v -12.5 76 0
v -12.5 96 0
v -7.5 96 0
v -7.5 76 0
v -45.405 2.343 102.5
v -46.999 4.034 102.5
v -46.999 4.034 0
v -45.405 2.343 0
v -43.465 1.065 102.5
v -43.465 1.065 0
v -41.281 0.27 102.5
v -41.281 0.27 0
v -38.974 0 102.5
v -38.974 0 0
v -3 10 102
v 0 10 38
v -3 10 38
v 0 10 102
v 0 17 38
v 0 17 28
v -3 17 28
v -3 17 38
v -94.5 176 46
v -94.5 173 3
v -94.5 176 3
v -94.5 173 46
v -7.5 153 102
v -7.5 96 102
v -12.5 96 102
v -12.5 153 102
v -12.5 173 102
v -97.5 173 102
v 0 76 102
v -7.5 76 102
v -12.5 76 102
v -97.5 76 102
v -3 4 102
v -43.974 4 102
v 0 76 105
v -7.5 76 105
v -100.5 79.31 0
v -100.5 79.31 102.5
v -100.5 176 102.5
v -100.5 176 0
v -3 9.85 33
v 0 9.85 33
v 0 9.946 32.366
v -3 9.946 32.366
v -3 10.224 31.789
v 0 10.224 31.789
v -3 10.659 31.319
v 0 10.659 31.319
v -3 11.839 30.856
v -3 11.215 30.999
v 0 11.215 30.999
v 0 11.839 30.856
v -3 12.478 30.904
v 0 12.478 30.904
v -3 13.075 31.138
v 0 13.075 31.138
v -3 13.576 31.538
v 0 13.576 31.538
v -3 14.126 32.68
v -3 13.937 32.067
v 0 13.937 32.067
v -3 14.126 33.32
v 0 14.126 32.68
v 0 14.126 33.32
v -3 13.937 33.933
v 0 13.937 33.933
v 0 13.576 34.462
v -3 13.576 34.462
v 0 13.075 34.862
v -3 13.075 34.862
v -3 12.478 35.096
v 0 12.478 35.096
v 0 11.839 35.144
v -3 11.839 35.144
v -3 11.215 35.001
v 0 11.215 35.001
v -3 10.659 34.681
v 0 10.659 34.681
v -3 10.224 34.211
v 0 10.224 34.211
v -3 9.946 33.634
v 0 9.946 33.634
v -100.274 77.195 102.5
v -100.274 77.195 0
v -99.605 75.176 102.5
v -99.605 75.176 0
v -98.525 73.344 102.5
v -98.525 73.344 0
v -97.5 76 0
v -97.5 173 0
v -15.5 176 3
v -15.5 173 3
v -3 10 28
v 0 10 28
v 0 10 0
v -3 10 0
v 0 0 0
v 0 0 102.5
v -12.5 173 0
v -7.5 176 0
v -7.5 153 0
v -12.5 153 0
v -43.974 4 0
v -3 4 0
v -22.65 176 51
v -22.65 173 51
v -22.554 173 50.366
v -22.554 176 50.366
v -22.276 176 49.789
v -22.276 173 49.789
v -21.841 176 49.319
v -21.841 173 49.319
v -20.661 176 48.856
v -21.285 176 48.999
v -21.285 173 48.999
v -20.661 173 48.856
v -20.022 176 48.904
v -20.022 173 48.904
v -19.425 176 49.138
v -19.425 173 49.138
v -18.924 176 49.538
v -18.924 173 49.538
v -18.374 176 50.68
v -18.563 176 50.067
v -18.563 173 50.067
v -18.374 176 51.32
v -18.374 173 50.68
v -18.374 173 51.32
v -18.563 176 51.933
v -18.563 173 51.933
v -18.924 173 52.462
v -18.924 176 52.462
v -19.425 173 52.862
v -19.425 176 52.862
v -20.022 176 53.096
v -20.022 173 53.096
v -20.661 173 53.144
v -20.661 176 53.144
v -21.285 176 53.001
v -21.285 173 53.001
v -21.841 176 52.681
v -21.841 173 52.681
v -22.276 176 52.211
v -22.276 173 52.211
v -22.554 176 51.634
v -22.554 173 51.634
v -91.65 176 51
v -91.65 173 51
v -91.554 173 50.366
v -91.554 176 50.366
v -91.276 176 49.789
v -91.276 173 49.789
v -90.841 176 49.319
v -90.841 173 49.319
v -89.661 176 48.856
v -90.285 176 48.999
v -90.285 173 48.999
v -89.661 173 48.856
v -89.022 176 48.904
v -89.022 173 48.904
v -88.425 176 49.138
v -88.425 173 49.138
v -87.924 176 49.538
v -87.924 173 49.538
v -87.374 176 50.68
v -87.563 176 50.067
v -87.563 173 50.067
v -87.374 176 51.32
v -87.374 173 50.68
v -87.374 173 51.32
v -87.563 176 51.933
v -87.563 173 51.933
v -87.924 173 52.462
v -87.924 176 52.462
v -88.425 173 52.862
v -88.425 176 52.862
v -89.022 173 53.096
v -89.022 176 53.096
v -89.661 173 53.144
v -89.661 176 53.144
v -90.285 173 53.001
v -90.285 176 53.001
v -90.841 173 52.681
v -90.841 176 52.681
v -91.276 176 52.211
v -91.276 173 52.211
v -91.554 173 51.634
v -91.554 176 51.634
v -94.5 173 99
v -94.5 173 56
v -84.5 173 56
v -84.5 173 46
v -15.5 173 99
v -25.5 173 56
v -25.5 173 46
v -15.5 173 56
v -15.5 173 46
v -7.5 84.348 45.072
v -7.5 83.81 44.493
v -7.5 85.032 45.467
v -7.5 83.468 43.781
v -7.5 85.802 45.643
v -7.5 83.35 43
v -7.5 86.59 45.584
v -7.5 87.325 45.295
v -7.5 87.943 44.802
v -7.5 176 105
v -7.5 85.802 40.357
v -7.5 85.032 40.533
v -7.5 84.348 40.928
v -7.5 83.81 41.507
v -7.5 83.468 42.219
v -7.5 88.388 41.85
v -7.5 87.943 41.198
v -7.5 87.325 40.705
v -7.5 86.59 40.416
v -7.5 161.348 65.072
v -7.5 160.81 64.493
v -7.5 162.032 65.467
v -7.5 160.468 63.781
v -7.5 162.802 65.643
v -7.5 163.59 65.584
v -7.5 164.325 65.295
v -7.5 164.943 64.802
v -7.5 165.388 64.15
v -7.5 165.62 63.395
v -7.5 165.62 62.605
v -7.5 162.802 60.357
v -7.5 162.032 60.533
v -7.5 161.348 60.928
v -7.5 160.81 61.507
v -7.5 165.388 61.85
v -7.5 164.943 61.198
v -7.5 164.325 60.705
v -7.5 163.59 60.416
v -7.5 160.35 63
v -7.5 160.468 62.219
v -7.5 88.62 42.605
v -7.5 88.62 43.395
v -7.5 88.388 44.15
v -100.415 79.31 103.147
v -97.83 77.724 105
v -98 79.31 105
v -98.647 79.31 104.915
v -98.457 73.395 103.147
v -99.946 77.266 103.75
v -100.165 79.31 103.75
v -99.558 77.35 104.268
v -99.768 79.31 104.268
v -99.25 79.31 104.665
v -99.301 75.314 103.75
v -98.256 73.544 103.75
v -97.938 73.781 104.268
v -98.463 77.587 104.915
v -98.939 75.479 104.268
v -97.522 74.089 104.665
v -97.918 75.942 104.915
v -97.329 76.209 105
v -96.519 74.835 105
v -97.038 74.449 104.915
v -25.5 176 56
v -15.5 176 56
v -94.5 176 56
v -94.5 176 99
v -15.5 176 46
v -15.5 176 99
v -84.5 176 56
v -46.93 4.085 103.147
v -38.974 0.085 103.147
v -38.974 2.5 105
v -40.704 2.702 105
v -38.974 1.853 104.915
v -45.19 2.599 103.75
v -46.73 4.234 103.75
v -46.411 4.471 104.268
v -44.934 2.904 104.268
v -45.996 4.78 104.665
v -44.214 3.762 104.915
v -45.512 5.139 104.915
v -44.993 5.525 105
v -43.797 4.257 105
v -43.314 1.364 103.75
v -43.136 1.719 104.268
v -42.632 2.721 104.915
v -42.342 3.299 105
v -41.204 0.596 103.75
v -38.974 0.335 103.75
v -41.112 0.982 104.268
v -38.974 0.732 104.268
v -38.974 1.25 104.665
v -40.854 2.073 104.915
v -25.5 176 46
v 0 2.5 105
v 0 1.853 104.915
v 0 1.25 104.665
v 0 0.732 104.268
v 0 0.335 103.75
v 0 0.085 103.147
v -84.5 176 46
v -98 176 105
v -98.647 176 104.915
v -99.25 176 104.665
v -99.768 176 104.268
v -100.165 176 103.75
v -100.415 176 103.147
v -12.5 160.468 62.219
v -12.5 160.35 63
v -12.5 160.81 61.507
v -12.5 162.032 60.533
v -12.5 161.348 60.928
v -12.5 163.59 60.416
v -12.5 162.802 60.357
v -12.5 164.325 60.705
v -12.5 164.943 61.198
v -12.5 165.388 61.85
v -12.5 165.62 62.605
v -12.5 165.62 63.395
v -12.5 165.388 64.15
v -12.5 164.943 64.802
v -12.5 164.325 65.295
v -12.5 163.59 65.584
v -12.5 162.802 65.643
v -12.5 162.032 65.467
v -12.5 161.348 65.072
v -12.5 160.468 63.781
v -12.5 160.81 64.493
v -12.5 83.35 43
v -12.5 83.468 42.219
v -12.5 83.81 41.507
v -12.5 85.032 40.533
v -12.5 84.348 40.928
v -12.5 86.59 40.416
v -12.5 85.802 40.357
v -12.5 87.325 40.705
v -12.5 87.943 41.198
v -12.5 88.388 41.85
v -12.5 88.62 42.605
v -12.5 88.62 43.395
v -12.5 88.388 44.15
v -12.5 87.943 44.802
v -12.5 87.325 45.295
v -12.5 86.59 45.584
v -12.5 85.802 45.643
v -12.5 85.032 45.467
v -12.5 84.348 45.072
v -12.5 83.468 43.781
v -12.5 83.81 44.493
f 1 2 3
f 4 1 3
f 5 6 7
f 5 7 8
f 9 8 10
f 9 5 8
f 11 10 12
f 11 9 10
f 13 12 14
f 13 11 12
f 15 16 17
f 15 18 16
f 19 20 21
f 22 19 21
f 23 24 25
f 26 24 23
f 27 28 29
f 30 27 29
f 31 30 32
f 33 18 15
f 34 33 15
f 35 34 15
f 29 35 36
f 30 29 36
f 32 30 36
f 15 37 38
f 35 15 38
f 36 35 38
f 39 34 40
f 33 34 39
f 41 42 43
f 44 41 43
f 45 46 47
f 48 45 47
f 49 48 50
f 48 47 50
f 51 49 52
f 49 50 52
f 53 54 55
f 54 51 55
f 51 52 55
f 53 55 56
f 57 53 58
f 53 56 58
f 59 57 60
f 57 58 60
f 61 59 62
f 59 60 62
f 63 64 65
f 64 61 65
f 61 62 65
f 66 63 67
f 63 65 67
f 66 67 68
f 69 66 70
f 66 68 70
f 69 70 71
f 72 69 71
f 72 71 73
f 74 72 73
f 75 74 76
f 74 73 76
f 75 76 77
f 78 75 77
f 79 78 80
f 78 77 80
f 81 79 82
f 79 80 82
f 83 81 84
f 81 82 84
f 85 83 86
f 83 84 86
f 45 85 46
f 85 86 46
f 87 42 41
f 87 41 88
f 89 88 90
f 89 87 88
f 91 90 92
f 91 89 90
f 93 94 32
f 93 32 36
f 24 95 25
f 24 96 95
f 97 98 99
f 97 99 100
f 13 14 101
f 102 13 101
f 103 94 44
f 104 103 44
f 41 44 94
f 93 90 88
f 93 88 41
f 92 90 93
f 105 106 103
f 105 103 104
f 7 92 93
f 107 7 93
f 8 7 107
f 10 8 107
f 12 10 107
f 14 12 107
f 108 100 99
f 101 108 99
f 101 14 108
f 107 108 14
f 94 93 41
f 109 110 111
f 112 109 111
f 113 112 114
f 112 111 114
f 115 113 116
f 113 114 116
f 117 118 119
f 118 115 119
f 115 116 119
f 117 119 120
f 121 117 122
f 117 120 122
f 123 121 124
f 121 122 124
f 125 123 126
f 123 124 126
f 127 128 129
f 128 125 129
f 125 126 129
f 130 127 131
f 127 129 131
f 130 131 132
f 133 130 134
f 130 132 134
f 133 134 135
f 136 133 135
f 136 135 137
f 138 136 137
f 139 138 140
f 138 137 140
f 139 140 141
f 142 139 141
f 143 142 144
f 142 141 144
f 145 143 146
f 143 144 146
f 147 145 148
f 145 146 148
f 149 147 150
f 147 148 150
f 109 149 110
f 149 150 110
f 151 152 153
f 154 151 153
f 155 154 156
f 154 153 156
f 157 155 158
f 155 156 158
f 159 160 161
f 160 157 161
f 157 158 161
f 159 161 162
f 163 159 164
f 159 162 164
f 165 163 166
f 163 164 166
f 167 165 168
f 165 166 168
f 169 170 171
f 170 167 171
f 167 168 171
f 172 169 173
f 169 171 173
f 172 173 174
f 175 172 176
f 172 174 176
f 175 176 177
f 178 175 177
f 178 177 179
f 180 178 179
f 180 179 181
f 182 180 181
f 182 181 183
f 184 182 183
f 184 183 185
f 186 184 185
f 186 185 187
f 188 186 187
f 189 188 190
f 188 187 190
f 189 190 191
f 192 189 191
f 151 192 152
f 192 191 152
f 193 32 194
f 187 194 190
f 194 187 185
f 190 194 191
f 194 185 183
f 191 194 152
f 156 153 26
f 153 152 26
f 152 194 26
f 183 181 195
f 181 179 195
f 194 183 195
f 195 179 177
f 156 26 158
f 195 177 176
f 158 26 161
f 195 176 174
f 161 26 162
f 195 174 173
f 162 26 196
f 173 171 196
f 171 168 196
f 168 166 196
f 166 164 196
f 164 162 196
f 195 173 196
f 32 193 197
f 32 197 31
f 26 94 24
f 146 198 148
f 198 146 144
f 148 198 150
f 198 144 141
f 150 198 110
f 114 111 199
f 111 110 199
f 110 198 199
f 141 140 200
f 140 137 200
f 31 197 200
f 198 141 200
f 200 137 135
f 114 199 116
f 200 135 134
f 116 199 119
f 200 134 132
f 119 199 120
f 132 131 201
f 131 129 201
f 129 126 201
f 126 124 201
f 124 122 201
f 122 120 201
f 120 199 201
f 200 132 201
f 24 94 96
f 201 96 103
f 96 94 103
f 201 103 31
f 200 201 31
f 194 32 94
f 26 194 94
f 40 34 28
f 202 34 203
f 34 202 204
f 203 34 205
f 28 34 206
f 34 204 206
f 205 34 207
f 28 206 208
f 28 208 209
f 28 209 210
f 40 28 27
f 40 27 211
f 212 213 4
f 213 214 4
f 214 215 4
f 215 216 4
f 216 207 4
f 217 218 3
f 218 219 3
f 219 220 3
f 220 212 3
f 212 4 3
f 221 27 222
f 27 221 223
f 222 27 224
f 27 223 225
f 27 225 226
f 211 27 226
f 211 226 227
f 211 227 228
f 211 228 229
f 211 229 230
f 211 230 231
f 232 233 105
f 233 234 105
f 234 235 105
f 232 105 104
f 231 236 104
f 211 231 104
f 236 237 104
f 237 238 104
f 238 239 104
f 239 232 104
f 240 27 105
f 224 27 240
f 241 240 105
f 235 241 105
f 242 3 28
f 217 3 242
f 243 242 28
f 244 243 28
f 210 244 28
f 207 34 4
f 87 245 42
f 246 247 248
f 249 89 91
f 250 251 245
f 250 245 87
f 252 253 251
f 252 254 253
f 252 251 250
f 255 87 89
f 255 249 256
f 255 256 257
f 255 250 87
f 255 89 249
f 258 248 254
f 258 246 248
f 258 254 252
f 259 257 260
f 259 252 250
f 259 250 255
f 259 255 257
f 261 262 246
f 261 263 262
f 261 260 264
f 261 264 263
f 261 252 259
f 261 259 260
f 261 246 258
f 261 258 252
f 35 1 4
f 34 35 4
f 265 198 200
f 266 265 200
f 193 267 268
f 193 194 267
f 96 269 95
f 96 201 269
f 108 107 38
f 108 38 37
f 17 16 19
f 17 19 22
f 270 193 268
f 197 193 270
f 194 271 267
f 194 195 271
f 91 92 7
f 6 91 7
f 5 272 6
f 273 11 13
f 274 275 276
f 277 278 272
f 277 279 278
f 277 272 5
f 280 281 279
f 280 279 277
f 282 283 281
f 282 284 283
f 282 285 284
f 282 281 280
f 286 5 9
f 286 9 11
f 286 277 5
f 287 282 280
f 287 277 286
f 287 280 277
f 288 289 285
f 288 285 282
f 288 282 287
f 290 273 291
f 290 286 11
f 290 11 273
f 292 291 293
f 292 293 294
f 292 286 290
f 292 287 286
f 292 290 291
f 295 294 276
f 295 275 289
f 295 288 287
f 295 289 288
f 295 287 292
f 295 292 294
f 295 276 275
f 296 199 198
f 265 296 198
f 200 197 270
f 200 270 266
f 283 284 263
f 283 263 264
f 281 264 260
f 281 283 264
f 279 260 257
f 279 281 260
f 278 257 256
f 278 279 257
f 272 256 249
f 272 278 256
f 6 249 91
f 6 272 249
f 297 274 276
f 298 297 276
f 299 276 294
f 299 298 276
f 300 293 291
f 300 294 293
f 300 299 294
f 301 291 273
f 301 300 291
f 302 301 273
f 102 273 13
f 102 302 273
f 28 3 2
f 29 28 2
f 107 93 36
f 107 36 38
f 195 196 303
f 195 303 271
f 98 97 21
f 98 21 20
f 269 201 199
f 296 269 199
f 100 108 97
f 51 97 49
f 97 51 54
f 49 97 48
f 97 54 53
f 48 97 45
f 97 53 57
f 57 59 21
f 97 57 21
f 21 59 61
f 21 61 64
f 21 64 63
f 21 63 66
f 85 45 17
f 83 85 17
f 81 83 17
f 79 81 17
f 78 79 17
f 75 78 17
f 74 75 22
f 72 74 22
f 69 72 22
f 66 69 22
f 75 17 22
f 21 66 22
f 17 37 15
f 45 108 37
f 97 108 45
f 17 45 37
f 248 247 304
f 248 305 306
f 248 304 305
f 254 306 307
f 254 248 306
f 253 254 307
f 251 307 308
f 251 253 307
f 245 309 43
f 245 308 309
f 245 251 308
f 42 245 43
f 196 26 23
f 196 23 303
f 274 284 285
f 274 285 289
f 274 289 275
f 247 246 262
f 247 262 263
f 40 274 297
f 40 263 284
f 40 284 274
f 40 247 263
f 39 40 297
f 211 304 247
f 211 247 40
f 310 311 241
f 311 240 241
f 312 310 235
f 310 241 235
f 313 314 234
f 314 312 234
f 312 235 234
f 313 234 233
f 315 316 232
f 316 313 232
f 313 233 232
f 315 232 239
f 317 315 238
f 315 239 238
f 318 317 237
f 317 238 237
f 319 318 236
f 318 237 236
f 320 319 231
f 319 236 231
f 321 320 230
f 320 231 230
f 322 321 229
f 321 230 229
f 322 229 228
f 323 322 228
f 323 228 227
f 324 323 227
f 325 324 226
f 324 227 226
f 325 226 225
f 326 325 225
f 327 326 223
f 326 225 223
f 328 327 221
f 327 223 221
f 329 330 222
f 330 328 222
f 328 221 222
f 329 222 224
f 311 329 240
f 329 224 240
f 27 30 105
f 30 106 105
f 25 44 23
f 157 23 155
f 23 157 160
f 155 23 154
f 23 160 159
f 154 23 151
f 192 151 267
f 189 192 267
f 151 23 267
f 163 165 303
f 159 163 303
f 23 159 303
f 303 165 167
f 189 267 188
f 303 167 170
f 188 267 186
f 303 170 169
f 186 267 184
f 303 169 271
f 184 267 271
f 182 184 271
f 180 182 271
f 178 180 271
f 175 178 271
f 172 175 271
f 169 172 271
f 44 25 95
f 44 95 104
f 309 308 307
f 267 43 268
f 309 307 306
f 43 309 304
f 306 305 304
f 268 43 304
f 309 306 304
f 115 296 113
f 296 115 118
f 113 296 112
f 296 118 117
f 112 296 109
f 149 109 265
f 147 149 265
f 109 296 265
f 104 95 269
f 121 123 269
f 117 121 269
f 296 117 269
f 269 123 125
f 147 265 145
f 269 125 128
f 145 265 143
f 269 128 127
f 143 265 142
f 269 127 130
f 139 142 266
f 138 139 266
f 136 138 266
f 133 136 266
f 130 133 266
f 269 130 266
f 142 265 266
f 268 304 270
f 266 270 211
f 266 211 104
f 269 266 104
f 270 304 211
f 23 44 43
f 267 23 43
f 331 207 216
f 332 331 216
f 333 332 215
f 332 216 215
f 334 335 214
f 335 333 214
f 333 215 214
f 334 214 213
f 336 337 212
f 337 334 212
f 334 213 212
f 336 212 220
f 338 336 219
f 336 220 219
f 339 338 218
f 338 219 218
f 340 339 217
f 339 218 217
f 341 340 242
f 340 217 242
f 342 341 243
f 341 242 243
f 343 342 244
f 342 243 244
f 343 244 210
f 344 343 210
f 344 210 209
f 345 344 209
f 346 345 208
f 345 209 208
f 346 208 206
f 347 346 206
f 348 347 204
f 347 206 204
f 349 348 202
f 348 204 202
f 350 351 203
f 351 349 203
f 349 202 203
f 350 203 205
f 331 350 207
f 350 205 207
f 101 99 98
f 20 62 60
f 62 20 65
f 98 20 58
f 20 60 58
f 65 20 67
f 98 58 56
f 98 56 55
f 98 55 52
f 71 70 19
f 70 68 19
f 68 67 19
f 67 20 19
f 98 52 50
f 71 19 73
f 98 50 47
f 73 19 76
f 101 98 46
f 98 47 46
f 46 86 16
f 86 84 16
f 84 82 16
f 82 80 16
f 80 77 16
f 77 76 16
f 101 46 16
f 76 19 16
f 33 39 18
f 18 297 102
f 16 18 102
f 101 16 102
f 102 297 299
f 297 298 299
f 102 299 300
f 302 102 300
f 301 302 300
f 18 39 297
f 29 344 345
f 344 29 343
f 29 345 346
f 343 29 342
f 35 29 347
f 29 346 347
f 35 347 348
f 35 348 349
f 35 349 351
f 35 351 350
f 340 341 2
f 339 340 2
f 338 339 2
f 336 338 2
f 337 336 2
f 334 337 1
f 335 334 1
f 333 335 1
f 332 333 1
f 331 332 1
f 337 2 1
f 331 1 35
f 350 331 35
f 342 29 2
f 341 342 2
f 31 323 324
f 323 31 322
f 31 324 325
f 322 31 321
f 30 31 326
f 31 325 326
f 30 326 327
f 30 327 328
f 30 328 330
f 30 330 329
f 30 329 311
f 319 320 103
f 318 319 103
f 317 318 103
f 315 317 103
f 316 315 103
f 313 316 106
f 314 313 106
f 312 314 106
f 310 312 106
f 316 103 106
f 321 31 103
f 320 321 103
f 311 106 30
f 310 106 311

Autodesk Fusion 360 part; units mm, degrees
sketch "스케치1" plane through (0, 0, 0) normal (0, 0, 1) x (1, 0, 0)
  line L0 (0, 0) -> (44, 0)
  line L1 (0, 0) -> (0, 4)
  line L2 (0, 4) -> (41, 4)
  line L3 (0, 0) -> (44, 0)
  line L4 (44, 0) -> (100.5, 76)
  line L5 (100.5, 76) -> (97.5, 76)
  line L6 (44, 0) -> (41, 0)
  line L7 (41, 0) -> (97.5, 76)
  line L8 (41, 4) -> (43.9737, 4)
  line L9 (100.5, 76) -> (97.5, 76)
  line L10 (97.5, 76) -> (97.5, 176)
  line L11 (97.5, 176) -> (100.5, 176)
  line L12 (100.5, 176) -> (100.5, 76)
  line L13 (0, 4) -> (0, 76)
  line L14 (0, 76) -> (7.5, 76)
  line L15 (7.5, 76) -> (12.5, 76)
  line L16 (12.5, 76) -> (12.5, 96)
  line L17 (12.5, 96) -> (7.5, 96)
  line L18 (7.5, 96) -> (7.5, 76)
  line L19 (97.5, 176) -> (12.5, 176)
  line L20 (12.5, 176) -> (12.5, 173)
  line L21 (12.5, 173) -> (97.5, 173)
  line L22 (97.5, 173) -> (97.5, 176)
  line L23 (12.5, 176) -> (7.5, 176)
  line L24 (7.5, 176) -> (7.5, 153)
  line L25 (7.5, 153) -> (12.5, 153)
  line L26 (12.5, 153) -> (12.5, 176)
  dimension "d1" = 44
  dimension "d2" = 4
  dimension "d3" = 41
  dimension "d7" = 3
  dimension "d8" = 3
  dimension "d9" = 3
  dimension "d10" = 100
  dimension "d19" = 72
  dimension "d20" = 7.5
  dimension "d21" = 5
  dimension "d22" = 20
  dimension "d26" = 85
  dimension "d27" = 3
  dimension "d28" = 23
extrude "돌출1" add sketch "스케치1" along normal blind 105 makes body 1 at (100.5, 142.6667, 35) makes body 2 at (7.5, 89.3333, 35)
sketch "스케치2" plane through (0, 0, 105) normal (0, 0, 1) x (-1, 0, 0)
  line L0 (0, 0) -> (-44, 0)
  line L1 (-44, 0) -> (-100.5, -76)
  line L2 (-100.5, -76) -> (-100.5, -176)
  line L3 (-100.5, -176) -> (-7.5, -176)
  line L4 (-97.5, -173) -> (-97.5, -76)
  line L5 (-97.5, -76) -> (-43.9737, -4)
  line L6 (-43.9737, -4) -> (0, -4)
  line L7 (0, -4) -> (0, 0)
  line L8 (0, -4) -> (0, -176)
  line L9 (0, -176) -> (-7.5, -176)
  line L10 (-12.5, -153) -> (-12.5, -173)
  line L11 (-12.5, -173) -> (-97.5, -173)
  line L12 (-7.5, -176) -> (-7.5, -153)
  line L13 (-7.5, -153) -> (-12.5, -153)
extrude "돌출2" add sketch "스케치2" against normal blind 3 contours L4 L5 L6 L8 L9 L10 L11 L12 L13 bodies 1 2
fillet "필렛1" radius 10 2 edges at (100.5, 76, 52.5) (44, 0, 52.5) on bodies 1
fillet "필렛2" radius 2.5 5 edges at (19.4868, 0, 105) (43.4646, 1.0652, 105) (72.7621, 38.6888, 105) (99.9935, 76.1676, 105) (100.5, 127.6549, 105) on bodies 1
sketch "스케치3" plane through (0, 173, 0) normal (0, -1, 0) x (1, 0, 0)
  line L0 (97.5, 102) -> (12.5, 102)
  line L1 (12.5, 102) -> (12.5, 0)
  line L2 (12.5, 0) -> (97.5, 0)
  line L3 (97.5, 0) -> (97.5, 102)
  line L4 (97.5, 0) -> (94.5, 0)
  line L5 (94.5, 0) -> (94.5, 3)
  line L6 (94.5, 3) -> (97.5, 3)
  line L7 (97.5, 3) -> (97.5, 0)
  line L8 (12.5, 102) -> (15.5, 102)
  line L9 (15.5, 102) -> (15.5, 99)
  line L10 (15.5, 99) -> (12.5, 99)
  line L11 (12.5, 99) -> (12.5, 102)
  line L12 (15.5, 99) -> (94.5, 99)
  line L13 (94.5, 99) -> (94.5, 3)
  line L14 (94.5, 3) -> (15.5, 3)
  line L15 (15.5, 3) -> (15.5, 99)
  line L16 (94.5, 99) -> (94.5, 56)
  line L17 (94.5, 56) -> (84.5, 56)
  line L18 (84.5, 56) -> (84.5, 46)
  line L19 (84.5, 46) -> (94.5, 46)
  line L20 (94.5, 46) -> (94.5, 56)
  line L21 (15.5, 56) -> (25.5, 56)
  line L22 (25.5, 56) -> (25.5, 46)
  line L23 (25.5, 46) -> (15.5, 46)
  line L24 (15.5, 46) -> (15.5, 56)
  circle A0 centre (89.5, 51) radius 2.15
  circle A1 centre (20.5, 51) radius 2.15
  dimension "d29" = 3
  dimension "d30" = 3
  dimension "d31" = 3
  dimension "d32" = 3
  dimension "d35" = 43
  dimension "d36" = 10
  dimension "d37" = 10
  dimension "d38" = 10
  dimension "d39" = 10
  dimension "d40" = 4.3
  dimension "d41" = 4.3
extrude "돌출3" cut sketch "스케치3" against normal blind 3 contours L12 L13 L14 L15 L16 L17 L18 L19 L21 L22 L23 | A0 | A1 bodies 1
sketch "스케치4" plane through (7.5, 0, 0) normal (-1, 0, 0) x (0, -1, 0)
  line L0 (-153, 102) -> (-176, 102)
  line L1 (-176, 102) -> (-176, 0)
  line L2 (-176, 0) -> (-153, 0)
  line L3 (-153, 0) -> (-153, 102)
  line L4 (-153, 102) -> (-153, 73)
  line L5 (-153, 73) -> (-173, 73)
  line L6 (-173, 73) -> (-173, 53)
  line L7 (-173, 53) -> (-153, 53)
  line L8 (-153, 53) -> (-153, 73)
  circle A0 centre (-163, 63) radius 2.65
  dimension "d42" = 29
  dimension "d43" = 20
  dimension "d44" = 20
  dimension "d45" = 5.3
sketch "스케치5" plane through (7.5, 0, 0) normal (-1, 0, 0) x (0, -1, 0)
  line L0 (-76, 102) -> (-96, 102)
  line L1 (-96, 102) -> (-96, 0)
  line L2 (-96, 0) -> (-76, 0)
  line L3 (-76, 0) -> (-76, 102)
  line L4 (-76, 102) -> (-76, 53)
  line L5 (-76, 53) -> (-96, 53)
  line L6 (-96, 53) -> (-96, 33)
  line L7 (-96, 33) -> (-76, 33)
  line L8 (-76, 33) -> (-76, 53)
  circle A0 centre (-86, 43) radius 2.65
  dimension "d46" = 49
  dimension "d47" = 20
  dimension "d48" = 5.3
extrude "돌출4" cut sketch "스케치4" sketch "스케치5" against normal blind 5 contours A0 of sketch 2 contours A0 bodies 1
sketch "스케치6" plane through (0, 0, 102) normal (0, 0, -1) x (1, 0, 0)
  line L0 (7.5, -176) -> (7.5, -153)
  line L1 (7.5, -153) -> (12.5, -153)
  line L2 (12.5, -153) -> (12.5, -173)
  line L3 (12.5, -173) -> (97.5, -173)
  line L4 (97.5, -173) -> (97.5, -76)
  line L5 (97.5, -76) -> (43.9737, -4)
  line L6 (43.9737, -4) -> (0, -4)
  line L7 (0, -4) -> (0, -176)
  line L8 (0, -176) -> (7.5, -176)
  line L9 (12.5, -96) -> (7.5, -96)
  line L10 (7.5, -96) -> (7.5, -76)
  line L11 (7.5, -76) -> (12.5, -76)
  line L12 (12.5, -76) -> (12.5, -96)
  line L13 (0, -76) -> (7.5, -76)
  line L14 (7.5, -76) -> (7.5, -176)
  line L15 (7.5, -176) -> (0, -176)
  line L16 (0, -176) -> (0, -76)
extrude "돌출5" cut sketch "스케치6" against normal blind 3 contours L0 L7 L8 L10 L13 L14 L15 L16 bodies 1
sketch "스케치7" plane through (0, 4, 0) normal (0, 1, 0) x (-1, 0, 0)
  line L0 (0, 102) -> (-43.9737, 102)
  line L1 (-43.9737, 102) -> (-43.9737, 0)
  line L2 (-43.9737, 0) -> (0, 0)
  line L3 (0, 0) -> (0, 102)
  line L4 (0, 0) -> (0, 28)
  line L5 (0, 28) -> (-3, 28)
  line L6 (-3, 28) -> (-3, 38)
  line L7 (-3, 38) -> (0, 38)
  line L8 (0, 38) -> (0, 28)
  dimension "d53" = 28
  dimension "d54" = 3
  dimension "d55" = 10
extrude "돌출6" add sketch "스케치7" along normal blind 13 contours L3 L5 L6 L7 L8 bodies 1
sketch "스케치8" plane through (0, 0, 0) normal (-1, 0, 0) x (0, -1, 0)
  line L0 (-76, 105) -> (-76, 102)
  line L1 (-76, 102) -> (-4, 102)
  line L2 (-4, 102) -> (-4, 38)
  line L3 (-4, 38) -> (-17, 38)
  line L4 (-17, 38) -> (-17, 28)
  line L5 (-17, 28) -> (-4, 28)
  line L6 (-4, 28) -> (-4, 0)
  line L7 (-4, 0) -> (0, 0)
  line L8 (0, 0) -> (0, 102.5)
  arc A0 (0, 102.5) -> (-2.5, 105) centre (-2.5, 102.5) ccw
  line L9 (-2.5, 105) -> (-76, 105)
  line L10 (-17, 38) -> (-7, 38)
  line L11 (-7, 38) -> (-7, 28)
  line L12 (-7, 28) -> (-17, 28)
  line L13 (-17, 28) -> (-17, 38)
  circle A1 centre (-12, 33) radius 2.15
  dimension "d58" = 4.3
extrude "돌출7" cut sketch "스케치8" against normal blind 3 contours A1 bodies 1
sketch "스케치9" plane through (0, 0, 102) normal (0, 0, -1) x (1, 0, 0)
  line L0 (7.5, -96) -> (7.5, -153)
  line L1 (7.5, -153) -> (12.5, -153)
  line L2 (12.5, -153) -> (12.5, -173)
  line L3 (12.5, -173) -> (97.5, -173)
  line L4 (97.5, -173) -> (97.5, -76)
  line L5 (97.5, -76) -> (43.9737, -4)
  line L6 (43.9737, -4) -> (0, -4)
  line L7 (0, -4) -> (0, -76)
  line L8 (0, -76) -> (7.5, -76)
  line L9 (7.5, -76) -> (12.5, -76)
  line L10 (12.5, -76) -> (12.5, -96)
  line L11 (12.5, -96) -> (7.5, -96)
  line L12 (0, -4) -> (3, -4)
  line L13 (3, -4) -> (3, -10)
  line L14 (3, -10) -> (0, -10)
  line L15 (0, -10) -> (0, -4)
  dimension "d61" = 3
  dimension "d62" = 6
extrude "돌출8" add sketch "스케치9" along normal blind 64 contours L6 L7 L12 L13 L14 L15 bodies 1
sketch "스케치10" plane through (0, 0, 28) normal (0, 0, -1) x (1, 0, 0)
  line L0 (3, -4) -> (0, -4)
  line L1 (0, -4) -> (0, -17)
  line L2 (0, -17) -> (3, -17)
  line L3 (3, -17) -> (3, -4)
  line L4 (0, -4) -> (3, -4)
  line L5 (3, -4) -> (3, -10)
  line L6 (3, -10) -> (0, -10)
  line L7 (0, -10) -> (0, -4)
  dimension "d65" = 6
extrude "돌출9" add sketch "스케치10" along normal blind 28 contours L0 L1 L3 L4 L5 L6 L7 bodies 1
mirror "미러1" about plane through (0, 0, 0) normal (1, 0, 0) of bodies 1 makes body 3
hidden bodies 1
